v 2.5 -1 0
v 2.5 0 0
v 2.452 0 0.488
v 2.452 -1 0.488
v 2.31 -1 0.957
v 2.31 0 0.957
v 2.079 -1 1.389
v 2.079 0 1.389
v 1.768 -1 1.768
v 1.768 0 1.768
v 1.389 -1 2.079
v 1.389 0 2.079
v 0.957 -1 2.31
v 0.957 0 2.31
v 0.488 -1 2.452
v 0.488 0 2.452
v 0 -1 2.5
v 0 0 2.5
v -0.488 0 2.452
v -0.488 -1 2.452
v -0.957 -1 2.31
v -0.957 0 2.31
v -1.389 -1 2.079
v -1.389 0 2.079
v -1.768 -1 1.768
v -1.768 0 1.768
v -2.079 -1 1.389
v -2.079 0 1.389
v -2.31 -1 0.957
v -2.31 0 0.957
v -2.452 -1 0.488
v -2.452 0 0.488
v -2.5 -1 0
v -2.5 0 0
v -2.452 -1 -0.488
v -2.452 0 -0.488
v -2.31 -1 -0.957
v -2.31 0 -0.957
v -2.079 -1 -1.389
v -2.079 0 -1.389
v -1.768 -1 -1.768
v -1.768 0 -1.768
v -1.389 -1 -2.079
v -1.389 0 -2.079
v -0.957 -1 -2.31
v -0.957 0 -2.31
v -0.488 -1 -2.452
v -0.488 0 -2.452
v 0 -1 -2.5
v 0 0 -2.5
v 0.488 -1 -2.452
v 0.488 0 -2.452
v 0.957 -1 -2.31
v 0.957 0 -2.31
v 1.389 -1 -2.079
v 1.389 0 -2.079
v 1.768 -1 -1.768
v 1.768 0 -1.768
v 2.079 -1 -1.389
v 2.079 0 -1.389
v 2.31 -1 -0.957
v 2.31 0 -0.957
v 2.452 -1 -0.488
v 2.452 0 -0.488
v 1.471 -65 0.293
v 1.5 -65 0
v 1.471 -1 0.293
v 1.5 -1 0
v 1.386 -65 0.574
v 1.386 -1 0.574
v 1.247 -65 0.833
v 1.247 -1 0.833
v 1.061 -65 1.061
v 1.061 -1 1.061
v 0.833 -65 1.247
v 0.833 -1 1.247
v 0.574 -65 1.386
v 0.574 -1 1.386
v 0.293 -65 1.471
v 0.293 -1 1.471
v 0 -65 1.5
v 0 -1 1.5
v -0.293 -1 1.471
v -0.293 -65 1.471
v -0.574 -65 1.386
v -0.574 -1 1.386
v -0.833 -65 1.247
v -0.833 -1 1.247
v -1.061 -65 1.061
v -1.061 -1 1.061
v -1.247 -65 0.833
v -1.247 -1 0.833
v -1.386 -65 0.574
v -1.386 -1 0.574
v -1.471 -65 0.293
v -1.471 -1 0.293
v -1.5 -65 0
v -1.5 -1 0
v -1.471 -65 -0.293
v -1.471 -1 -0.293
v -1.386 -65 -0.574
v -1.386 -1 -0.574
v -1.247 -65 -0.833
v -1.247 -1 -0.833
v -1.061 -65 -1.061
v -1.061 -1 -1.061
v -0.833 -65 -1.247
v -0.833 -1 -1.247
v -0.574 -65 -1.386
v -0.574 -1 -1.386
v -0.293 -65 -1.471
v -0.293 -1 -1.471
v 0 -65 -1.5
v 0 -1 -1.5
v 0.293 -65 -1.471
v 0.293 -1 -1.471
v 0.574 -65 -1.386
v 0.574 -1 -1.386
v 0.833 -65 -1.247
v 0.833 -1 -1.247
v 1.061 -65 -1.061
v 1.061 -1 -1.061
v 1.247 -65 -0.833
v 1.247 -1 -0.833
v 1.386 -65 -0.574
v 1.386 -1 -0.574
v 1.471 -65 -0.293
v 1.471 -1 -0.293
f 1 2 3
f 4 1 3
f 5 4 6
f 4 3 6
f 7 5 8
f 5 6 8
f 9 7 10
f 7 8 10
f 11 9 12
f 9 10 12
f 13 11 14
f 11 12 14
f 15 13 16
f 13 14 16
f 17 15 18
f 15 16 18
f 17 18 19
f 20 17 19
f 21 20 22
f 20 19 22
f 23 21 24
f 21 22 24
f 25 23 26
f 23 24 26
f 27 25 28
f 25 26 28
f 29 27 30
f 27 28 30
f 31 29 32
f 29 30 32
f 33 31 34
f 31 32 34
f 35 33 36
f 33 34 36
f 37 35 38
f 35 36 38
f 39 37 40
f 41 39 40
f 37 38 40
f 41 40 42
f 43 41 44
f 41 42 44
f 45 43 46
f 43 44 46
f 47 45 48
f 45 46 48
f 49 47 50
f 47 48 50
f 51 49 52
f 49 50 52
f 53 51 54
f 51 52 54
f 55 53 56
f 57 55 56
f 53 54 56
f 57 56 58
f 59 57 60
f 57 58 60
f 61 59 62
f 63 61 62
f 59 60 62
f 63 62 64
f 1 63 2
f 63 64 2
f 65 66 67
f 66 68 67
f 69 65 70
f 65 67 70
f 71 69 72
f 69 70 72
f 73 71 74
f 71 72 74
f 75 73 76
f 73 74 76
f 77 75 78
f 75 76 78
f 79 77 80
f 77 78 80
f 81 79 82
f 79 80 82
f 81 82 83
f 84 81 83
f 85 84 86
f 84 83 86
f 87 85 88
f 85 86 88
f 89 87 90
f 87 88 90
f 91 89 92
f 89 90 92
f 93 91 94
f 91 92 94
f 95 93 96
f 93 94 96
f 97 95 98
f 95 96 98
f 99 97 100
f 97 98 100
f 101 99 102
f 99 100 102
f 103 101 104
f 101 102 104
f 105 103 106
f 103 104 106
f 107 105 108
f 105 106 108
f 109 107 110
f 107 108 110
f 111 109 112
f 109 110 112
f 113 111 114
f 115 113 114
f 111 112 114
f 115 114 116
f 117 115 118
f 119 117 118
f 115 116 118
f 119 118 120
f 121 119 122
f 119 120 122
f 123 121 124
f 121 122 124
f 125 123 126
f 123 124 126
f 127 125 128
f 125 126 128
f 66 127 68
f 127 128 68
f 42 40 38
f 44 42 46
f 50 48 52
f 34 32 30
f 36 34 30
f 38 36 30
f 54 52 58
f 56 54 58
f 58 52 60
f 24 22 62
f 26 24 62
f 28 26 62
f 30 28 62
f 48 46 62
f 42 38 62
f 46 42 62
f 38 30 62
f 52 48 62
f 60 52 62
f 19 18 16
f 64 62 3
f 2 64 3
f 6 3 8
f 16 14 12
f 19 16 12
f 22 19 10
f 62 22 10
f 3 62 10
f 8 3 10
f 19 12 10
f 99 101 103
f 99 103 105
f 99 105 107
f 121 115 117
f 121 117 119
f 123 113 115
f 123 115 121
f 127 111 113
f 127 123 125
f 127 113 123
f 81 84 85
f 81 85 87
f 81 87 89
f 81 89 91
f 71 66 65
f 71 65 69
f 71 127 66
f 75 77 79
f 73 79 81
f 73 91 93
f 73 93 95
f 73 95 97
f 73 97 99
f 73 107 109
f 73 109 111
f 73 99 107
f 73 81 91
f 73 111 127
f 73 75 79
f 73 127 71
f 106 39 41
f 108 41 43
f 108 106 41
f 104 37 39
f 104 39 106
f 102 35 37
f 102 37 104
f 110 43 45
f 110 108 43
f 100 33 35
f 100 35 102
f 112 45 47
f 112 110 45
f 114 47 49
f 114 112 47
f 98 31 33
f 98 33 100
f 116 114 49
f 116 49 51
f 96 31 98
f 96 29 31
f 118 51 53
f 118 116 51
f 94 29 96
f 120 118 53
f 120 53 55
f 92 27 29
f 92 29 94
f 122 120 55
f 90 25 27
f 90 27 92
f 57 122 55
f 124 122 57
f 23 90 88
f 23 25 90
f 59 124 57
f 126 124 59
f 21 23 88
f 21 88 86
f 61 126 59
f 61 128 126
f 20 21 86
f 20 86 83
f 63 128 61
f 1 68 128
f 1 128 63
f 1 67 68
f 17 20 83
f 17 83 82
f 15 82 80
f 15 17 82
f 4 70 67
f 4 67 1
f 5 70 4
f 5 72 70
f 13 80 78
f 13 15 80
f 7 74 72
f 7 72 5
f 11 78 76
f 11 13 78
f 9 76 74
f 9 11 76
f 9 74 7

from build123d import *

# Parameters (mm, degrees)
F0_R     = 2.5
F0_R_2   = 1.5
F1_DEPTH = 1
F2_DEPTH = 64
F3_DEPTH = 1


with BuildPart() as f1:
    # F0 (on Front) → F1 (new body)
    with BuildSketch(Plane.XZ):
        Circle(F0_R)
        Circle(F0_R_2, mode=Mode.SUBTRACT)
        Circle(F0_R_2)
    extrude(amount=F1_DEPTH)

    # F0 (on Front) → F2 (join)
    with BuildSketch(Plane.XZ):
        Circle(F0_R_2)
    extrude(amount=F2_DEPTH)

    # F3 (add): a face of the model
    f3_faces = [f1.faces().sort_by_distance(p)[0] for p in [
        (0, -64, 0),
    ]]
    extrude(f3_faces, amount=F3_DEPTH)


solid = f1.part
